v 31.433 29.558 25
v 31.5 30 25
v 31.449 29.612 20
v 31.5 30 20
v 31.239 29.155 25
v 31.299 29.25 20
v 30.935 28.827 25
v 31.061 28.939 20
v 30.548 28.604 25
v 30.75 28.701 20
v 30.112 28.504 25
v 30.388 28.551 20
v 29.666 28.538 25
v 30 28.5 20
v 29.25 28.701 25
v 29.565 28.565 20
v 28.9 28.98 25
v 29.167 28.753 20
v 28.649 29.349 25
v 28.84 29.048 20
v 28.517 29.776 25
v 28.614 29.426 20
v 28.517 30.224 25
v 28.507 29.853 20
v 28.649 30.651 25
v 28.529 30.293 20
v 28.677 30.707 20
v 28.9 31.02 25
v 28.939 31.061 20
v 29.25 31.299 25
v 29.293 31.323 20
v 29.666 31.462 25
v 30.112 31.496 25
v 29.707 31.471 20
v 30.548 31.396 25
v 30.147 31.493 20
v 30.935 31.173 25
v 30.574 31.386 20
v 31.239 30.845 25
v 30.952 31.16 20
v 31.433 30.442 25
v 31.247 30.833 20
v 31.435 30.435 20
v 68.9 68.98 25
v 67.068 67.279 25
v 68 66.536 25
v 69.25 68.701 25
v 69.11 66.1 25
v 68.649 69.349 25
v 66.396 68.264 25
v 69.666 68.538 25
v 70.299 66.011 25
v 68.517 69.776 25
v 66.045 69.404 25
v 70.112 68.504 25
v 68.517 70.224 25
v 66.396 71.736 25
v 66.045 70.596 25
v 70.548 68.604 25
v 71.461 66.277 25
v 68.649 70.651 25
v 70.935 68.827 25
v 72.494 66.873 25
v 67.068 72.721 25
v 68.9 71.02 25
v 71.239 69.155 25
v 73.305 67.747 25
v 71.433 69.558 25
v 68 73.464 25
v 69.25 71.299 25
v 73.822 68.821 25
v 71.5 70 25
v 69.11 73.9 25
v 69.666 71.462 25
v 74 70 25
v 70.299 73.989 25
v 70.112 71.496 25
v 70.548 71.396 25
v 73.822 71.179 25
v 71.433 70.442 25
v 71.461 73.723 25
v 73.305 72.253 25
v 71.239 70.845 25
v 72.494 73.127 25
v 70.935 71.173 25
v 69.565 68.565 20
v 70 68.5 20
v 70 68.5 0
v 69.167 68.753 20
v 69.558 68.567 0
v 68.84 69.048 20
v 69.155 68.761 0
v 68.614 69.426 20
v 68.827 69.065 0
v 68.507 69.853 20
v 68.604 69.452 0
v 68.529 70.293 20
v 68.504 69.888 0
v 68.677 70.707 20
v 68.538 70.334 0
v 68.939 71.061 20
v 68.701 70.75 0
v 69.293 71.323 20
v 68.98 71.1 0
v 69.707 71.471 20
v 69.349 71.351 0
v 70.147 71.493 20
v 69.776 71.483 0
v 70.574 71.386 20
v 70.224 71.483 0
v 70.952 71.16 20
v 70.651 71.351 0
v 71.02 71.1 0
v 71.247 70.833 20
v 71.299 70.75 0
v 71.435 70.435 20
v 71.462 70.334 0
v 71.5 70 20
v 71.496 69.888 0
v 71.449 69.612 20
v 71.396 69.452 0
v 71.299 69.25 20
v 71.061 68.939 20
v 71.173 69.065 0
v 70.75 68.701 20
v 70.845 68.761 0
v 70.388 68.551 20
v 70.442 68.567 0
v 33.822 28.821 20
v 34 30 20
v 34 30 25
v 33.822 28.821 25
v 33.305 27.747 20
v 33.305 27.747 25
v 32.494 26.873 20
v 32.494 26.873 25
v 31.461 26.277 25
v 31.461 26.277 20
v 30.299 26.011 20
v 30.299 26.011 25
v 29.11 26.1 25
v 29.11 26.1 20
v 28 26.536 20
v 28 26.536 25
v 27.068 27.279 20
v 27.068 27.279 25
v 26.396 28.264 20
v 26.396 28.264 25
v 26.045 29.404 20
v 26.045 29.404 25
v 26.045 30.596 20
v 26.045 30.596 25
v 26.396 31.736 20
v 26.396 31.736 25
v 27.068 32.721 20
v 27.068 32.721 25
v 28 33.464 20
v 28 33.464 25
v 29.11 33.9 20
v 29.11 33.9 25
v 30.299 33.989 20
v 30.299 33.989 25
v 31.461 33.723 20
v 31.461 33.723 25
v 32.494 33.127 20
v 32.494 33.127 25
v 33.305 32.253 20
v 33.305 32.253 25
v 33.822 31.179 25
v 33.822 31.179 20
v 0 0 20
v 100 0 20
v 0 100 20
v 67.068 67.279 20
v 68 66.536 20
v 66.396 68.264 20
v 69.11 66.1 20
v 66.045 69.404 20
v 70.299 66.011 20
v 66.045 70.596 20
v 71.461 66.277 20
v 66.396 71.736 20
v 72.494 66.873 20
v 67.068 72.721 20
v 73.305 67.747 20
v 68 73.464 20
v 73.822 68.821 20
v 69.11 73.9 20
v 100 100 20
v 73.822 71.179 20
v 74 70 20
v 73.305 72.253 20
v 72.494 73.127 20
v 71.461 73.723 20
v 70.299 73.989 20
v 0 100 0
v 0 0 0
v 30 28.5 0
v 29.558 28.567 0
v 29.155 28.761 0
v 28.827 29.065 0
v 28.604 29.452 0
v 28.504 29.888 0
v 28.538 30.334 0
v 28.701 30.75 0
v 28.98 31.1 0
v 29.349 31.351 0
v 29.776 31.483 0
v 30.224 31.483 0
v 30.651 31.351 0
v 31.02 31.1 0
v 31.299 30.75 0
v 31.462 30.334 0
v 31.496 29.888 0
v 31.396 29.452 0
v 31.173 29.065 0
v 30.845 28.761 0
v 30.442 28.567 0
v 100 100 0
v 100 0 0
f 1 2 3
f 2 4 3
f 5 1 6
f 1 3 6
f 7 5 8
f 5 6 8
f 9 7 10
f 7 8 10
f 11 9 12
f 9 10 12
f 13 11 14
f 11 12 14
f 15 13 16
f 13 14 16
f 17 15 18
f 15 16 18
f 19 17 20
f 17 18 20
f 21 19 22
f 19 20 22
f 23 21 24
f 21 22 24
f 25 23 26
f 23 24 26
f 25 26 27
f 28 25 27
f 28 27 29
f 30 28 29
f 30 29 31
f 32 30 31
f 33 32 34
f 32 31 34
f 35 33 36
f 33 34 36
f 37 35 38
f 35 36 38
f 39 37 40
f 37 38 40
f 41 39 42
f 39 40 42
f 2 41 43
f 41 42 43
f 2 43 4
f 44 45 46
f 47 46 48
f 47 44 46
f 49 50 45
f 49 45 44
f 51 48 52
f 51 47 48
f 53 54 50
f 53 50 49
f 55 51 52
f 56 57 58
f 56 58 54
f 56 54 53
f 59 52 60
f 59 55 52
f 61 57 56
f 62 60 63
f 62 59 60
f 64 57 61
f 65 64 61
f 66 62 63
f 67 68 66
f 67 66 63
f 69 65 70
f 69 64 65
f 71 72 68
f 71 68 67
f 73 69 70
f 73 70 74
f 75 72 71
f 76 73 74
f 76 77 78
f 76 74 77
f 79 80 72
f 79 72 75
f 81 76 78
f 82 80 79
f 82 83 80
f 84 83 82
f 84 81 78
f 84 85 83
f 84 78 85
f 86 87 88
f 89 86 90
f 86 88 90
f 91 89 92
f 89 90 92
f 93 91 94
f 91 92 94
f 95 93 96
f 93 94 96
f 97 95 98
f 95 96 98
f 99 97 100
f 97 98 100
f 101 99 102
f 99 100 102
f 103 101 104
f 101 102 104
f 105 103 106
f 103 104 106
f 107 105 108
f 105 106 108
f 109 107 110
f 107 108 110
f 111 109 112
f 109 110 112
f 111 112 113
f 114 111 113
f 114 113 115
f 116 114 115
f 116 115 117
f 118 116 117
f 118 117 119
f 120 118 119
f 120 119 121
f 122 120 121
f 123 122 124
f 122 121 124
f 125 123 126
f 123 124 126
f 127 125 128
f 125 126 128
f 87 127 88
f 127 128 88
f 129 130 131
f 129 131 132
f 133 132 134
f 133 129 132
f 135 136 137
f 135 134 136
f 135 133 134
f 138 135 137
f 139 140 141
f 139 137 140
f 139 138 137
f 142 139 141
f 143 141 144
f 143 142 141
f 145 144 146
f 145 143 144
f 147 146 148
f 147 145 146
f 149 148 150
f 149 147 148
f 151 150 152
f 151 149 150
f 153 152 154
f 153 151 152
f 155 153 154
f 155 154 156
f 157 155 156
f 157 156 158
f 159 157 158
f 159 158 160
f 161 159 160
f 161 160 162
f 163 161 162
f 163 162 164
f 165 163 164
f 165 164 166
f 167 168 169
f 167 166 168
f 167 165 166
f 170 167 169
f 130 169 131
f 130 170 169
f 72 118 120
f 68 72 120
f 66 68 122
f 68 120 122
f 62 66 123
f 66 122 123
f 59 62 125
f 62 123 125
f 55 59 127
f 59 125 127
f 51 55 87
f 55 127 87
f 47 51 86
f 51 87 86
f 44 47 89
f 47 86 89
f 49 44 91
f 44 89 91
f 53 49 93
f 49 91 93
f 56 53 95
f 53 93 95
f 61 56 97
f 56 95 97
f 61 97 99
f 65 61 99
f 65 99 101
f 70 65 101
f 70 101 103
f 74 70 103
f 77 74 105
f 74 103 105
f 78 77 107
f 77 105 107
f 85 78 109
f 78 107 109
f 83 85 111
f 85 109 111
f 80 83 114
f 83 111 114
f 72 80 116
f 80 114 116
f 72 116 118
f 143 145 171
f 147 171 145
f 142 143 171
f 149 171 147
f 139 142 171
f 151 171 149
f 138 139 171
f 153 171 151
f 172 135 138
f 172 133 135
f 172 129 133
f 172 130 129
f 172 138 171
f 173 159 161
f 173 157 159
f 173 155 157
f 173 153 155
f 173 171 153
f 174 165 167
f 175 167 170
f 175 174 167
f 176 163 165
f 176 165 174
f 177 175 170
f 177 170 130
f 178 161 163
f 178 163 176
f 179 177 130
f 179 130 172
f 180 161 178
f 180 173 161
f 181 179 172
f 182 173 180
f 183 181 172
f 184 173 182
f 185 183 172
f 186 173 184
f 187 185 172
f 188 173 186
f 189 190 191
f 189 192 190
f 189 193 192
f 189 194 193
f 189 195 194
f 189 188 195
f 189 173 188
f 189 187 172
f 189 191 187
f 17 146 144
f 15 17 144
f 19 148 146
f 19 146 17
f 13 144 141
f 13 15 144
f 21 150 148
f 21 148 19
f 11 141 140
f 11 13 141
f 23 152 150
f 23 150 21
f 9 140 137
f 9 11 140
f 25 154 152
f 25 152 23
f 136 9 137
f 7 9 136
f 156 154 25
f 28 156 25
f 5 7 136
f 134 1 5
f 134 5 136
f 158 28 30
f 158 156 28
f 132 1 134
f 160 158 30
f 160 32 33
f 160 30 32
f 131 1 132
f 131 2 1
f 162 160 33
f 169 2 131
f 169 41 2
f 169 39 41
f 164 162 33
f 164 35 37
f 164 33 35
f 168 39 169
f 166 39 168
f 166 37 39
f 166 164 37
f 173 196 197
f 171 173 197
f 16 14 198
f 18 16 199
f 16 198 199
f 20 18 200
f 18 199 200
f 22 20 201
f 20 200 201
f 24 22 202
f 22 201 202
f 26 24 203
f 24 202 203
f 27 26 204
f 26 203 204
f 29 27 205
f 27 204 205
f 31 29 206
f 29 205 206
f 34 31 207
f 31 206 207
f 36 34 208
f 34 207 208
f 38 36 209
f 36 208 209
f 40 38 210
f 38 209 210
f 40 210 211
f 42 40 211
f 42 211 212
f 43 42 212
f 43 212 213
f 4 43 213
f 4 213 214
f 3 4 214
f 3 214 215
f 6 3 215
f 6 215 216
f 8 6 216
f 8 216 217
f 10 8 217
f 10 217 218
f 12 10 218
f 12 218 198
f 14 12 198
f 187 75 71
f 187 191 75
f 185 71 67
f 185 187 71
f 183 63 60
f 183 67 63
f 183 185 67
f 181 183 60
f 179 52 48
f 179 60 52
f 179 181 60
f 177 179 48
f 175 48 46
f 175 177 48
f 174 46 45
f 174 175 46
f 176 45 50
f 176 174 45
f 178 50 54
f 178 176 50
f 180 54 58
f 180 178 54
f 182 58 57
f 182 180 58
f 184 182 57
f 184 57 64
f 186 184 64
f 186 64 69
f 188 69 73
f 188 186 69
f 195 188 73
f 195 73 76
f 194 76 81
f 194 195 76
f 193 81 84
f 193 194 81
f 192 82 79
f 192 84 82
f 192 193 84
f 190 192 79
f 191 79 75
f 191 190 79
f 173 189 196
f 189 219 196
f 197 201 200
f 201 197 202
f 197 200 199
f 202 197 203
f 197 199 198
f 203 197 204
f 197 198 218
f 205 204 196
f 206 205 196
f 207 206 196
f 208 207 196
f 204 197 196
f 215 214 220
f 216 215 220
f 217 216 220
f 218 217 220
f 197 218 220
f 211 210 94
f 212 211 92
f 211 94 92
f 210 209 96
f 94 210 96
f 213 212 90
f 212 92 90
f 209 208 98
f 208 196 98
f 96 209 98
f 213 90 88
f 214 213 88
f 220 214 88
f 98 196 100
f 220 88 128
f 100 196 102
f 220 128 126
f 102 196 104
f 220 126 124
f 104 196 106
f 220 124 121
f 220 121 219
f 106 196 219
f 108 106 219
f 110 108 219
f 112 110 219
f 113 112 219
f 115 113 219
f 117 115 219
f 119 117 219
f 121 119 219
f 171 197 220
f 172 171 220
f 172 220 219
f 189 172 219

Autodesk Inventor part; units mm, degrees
ref_plane "YZ Plane" through (0, 0, 0) normal (1, 0, 0) x (0, 1, 0)
ref_plane "XZ Plane" through (0, 0, 0) normal (0, 1, 0) x (-1, 0, 0)
ref_plane "XY Plane" through (0, 0, 0) normal (0, 0, 1) x (1, 0, 0)
sketch "Skizze1" plane through (0, 0, 0) normal (0, 0, 1) x (1, 0, 0)
  line L0 (0, 0) -> (100, 0)
  line L1 (100, 0) -> (100, 100)
  line L2 (100, 100) -> (0, 100)
  line L3 (0, 100) -> (0, 0)
  dimension "d0" = 100
  dimension "d1" = 100
extrude "Extrusion1" add sketch "Skizze1" along normal blind 20
sketch "Skizze2" plane through (0, 0, 20) normal (0, 0, 1) x (1, 0, 0)
  line L0 (0, 0) -> (100, 0) projected
  line L1 (0, 100) -> (0, 0) projected
  line L2 (100, 100) -> (0, 100) projected
  line L3 (100, 0) -> (100, 100) projected
  point P0 (30, 30)
  point P1 (70, 70)
  dimension "d4" = 30
  dimension "d5" = 30
  dimension "d6" = 30
  dimension "d7" = 30
hole "Bohrung1" at (30, 30, 20) at (70, 70, 20) direction (0, 0, -1) diameter 3 end through all
sketch "Skizze3" plane through (0, 0, 20) normal (0, 0, 1) x (1, 0, 0)
  circle A0 centre (30, 30) radius 1.5
  circle A1 centre (30, 30) radius 4
  circle A2 centre (30, 30) radius 1.5 projected
  point P0 (0, 0)
  dimension "d15" = 3
  dimension "d16" = 8
extrude "Extrusion2" add sketch "Skizze3" along normal blind 5
sketch "Skizze4" plane through (0, 0, 20) normal (0, 0, 1) x (1, 0, 0)
  circle A0 centre (70, 70) radius 4
  circle A1 centre (70, 70) radius 1.5
  circle A2 centre (70, 70) radius 1.5 projected
  circle A3 centre (70, 70) radius 1.5 projected
  point P0 (0, 0)
  dimension "d19" = 3
  dimension "d20" = 8
extrude "Extrusion3" add sketch "Skizze4" along normal blind 5
properties part number "platine"
